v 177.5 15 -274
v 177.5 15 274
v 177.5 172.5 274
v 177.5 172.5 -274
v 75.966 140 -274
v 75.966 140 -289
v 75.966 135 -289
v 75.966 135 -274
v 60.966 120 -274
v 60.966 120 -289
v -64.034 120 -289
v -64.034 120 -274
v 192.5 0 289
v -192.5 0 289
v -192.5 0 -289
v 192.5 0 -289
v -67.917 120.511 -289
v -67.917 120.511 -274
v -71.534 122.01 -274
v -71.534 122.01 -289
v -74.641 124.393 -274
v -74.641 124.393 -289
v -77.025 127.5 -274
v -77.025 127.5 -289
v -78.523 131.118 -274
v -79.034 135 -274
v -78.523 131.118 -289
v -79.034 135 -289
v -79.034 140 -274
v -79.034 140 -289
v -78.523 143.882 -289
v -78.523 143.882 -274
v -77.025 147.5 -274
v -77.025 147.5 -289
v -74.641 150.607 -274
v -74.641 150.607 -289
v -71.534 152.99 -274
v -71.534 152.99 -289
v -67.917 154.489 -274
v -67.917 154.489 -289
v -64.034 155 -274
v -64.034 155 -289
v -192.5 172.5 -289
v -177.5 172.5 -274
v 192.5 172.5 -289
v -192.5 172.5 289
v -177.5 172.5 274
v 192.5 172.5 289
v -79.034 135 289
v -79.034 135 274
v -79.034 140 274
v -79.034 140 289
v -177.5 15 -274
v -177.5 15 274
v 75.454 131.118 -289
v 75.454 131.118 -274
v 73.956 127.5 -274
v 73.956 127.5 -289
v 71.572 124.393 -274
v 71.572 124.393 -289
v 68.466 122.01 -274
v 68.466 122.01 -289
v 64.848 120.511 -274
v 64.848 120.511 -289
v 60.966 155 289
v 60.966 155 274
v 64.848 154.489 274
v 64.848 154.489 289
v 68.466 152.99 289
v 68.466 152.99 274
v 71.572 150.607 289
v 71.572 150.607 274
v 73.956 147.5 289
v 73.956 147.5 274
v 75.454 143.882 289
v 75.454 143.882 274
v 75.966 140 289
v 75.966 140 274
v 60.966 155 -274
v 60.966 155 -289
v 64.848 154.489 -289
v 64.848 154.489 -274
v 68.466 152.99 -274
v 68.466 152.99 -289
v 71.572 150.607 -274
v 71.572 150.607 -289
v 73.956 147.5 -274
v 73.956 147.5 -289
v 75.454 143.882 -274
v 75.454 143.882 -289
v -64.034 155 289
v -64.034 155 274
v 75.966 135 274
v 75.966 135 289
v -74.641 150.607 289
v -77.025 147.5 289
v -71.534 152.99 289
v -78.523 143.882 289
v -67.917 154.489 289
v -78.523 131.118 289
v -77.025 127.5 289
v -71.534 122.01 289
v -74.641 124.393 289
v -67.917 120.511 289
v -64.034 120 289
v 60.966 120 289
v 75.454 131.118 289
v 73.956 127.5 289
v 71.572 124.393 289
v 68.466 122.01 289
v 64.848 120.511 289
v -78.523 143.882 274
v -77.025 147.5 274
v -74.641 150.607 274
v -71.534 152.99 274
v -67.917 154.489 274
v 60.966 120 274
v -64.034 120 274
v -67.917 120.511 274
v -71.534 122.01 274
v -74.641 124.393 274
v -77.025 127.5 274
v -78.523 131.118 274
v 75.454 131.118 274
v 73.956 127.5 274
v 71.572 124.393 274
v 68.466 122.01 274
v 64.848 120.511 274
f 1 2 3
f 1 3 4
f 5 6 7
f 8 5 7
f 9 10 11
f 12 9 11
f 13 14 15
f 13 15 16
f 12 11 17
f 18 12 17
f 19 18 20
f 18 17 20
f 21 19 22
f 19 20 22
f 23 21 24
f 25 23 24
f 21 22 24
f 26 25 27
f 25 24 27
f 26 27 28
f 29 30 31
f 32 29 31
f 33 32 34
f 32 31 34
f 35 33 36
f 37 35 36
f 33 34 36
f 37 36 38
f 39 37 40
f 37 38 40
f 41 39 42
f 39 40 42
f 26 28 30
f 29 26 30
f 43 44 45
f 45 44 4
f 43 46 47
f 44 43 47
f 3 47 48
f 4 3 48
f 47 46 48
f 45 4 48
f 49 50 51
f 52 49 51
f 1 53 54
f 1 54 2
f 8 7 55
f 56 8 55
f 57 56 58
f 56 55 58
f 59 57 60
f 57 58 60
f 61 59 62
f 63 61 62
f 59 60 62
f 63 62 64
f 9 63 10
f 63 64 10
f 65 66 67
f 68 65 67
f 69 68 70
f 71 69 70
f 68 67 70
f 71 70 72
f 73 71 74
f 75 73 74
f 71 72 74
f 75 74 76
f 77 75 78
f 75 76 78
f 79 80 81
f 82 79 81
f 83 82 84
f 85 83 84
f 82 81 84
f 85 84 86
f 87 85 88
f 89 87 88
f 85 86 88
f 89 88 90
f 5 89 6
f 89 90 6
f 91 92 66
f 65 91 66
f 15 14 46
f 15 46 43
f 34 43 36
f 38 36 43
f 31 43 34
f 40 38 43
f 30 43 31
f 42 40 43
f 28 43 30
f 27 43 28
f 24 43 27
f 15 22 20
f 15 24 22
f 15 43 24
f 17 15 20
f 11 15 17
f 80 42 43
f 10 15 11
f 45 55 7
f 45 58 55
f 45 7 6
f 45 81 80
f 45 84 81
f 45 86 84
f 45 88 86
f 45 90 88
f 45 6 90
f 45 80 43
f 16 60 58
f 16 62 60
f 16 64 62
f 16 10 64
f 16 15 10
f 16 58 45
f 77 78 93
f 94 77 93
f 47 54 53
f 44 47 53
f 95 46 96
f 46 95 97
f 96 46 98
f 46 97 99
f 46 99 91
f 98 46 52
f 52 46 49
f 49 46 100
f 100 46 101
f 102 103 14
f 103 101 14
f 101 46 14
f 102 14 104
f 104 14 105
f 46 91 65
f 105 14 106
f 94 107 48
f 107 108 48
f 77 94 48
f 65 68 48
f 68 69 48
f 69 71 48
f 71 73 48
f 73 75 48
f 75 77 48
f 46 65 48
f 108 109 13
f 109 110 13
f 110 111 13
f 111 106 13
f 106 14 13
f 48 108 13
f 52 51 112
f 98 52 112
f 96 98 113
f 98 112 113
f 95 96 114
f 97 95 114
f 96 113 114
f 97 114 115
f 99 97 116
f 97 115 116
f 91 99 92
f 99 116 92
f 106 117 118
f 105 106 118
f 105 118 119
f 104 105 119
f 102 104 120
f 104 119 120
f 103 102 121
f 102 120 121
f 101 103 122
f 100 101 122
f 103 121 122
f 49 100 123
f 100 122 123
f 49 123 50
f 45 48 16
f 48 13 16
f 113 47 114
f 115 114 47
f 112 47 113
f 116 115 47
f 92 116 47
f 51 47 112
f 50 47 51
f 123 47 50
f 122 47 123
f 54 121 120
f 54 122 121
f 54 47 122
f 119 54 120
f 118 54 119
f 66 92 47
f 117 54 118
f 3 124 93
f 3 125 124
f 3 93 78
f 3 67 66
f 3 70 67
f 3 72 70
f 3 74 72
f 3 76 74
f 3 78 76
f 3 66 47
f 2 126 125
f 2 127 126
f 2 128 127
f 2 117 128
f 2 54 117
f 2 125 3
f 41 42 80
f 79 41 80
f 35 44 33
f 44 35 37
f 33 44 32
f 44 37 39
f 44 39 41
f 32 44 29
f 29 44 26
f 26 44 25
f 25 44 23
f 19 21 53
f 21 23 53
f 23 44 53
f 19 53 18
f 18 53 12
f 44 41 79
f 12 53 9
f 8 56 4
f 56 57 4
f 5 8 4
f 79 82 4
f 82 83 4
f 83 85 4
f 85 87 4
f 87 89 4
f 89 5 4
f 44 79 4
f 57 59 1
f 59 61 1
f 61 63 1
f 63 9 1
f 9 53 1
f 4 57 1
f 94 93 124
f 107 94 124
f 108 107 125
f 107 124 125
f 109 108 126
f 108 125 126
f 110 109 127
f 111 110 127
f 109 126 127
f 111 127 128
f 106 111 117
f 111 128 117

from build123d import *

# Parameters (mm, degrees)
SKETCH1_W               = 385
SKETCH1_H               = 578
BOSS_EXTRUDE1_DEPTH     = 15
SKETCH2_W               = 15
SKETCH2_H               = 578
BOSS_EXTRUDE2_DEPTH     = 157.5
SKETCH3_W               = 355
SKETCH3_H               = 15
BOSS_EXTRUDE3_DEPTH     = 157.5
CUT_EXTRUDE1_DEPTH      = 634.16388084
CUT_EXTRUDE1_DEPTH_BACK = 634.16388084


with BuildPart() as part:
    # Sketch1 → Boss-Extrude1 (new body)
    with BuildSketch(Plane(origin=(0, 0, 0), x_dir=(1, 0, 0), z_dir=(0, 1, 0))):
        Rectangle(SKETCH1_W, SKETCH1_H)
    extrude(amount=BOSS_EXTRUDE1_DEPTH)

    # Sketch2 → Boss-Extrude2 (add)
    with BuildSketch(Plane(origin=(0, 15, 0), x_dir=(1, 0, 0), z_dir=(0, 1, 0))):
        with Locations((185, 0)):
            Rectangle(SKETCH2_W, SKETCH2_H)
    boss_extrude2 = extrude(amount=BOSS_EXTRUDE2_DEPTH)

    # Mirror1: Boss-Extrude2 across plane
    add(boss_extrude2.mirror(Plane(origin=(0, 0, 0), x_dir=(0, 0, 1), z_dir=(1, 0, 0))))

    # Sketch3 → Boss-Extrude3 (add)
    with BuildSketch(Plane(origin=(0, 15, 0), x_dir=(1, 0, 0), z_dir=(0, 1, 0))):
        with Locations((0, -281.5)):
            Rectangle(SKETCH3_W, SKETCH3_H)
    boss_extrude3 = extrude(amount=BOSS_EXTRUDE3_DEPTH)

    # Mirror2: Boss-Extrude3 across plane
    add(boss_extrude3.mirror(Plane.XY))

    # Sketch4 → Cut-Extrude1 (cut, two sides: drawn at the far end of the back side and taken through both)
    with BuildSketch(Plane.XY.offset(289).offset(-CUT_EXTRUDE1_DEPTH_BACK)):
        with BuildLine():
            Line((-64.034446869, 155), (60.965553131, 155))
            ThreePointArc((60.965553131, 155), (71.572154849, 150.606601718), (75.965553131, 140))
            Line((75.965553131, 140), (75.965553131, 135))
            ThreePointArc((75.965553131, 135), (71.572154849, 124.393398282), (60.965553131, 120))
            Line((60.965553131, 120), (-64.034446869, 120))
            ThreePointArc((-64.034446869, 120), (-74.641048586, 124.393398282), (-79.034446869, 135))
            Line((-79.034446869, 135), (-79.034446869, 140))
            ThreePointArc((-79.034446869, 140), (-74.641048586, 150.606601718), (-64.034446869, 155))
        make_face()
    extrude(amount=CUT_EXTRUDE1_DEPTH + CUT_EXTRUDE1_DEPTH_BACK, mode=Mode.SUBTRACT)


solid = part.part
